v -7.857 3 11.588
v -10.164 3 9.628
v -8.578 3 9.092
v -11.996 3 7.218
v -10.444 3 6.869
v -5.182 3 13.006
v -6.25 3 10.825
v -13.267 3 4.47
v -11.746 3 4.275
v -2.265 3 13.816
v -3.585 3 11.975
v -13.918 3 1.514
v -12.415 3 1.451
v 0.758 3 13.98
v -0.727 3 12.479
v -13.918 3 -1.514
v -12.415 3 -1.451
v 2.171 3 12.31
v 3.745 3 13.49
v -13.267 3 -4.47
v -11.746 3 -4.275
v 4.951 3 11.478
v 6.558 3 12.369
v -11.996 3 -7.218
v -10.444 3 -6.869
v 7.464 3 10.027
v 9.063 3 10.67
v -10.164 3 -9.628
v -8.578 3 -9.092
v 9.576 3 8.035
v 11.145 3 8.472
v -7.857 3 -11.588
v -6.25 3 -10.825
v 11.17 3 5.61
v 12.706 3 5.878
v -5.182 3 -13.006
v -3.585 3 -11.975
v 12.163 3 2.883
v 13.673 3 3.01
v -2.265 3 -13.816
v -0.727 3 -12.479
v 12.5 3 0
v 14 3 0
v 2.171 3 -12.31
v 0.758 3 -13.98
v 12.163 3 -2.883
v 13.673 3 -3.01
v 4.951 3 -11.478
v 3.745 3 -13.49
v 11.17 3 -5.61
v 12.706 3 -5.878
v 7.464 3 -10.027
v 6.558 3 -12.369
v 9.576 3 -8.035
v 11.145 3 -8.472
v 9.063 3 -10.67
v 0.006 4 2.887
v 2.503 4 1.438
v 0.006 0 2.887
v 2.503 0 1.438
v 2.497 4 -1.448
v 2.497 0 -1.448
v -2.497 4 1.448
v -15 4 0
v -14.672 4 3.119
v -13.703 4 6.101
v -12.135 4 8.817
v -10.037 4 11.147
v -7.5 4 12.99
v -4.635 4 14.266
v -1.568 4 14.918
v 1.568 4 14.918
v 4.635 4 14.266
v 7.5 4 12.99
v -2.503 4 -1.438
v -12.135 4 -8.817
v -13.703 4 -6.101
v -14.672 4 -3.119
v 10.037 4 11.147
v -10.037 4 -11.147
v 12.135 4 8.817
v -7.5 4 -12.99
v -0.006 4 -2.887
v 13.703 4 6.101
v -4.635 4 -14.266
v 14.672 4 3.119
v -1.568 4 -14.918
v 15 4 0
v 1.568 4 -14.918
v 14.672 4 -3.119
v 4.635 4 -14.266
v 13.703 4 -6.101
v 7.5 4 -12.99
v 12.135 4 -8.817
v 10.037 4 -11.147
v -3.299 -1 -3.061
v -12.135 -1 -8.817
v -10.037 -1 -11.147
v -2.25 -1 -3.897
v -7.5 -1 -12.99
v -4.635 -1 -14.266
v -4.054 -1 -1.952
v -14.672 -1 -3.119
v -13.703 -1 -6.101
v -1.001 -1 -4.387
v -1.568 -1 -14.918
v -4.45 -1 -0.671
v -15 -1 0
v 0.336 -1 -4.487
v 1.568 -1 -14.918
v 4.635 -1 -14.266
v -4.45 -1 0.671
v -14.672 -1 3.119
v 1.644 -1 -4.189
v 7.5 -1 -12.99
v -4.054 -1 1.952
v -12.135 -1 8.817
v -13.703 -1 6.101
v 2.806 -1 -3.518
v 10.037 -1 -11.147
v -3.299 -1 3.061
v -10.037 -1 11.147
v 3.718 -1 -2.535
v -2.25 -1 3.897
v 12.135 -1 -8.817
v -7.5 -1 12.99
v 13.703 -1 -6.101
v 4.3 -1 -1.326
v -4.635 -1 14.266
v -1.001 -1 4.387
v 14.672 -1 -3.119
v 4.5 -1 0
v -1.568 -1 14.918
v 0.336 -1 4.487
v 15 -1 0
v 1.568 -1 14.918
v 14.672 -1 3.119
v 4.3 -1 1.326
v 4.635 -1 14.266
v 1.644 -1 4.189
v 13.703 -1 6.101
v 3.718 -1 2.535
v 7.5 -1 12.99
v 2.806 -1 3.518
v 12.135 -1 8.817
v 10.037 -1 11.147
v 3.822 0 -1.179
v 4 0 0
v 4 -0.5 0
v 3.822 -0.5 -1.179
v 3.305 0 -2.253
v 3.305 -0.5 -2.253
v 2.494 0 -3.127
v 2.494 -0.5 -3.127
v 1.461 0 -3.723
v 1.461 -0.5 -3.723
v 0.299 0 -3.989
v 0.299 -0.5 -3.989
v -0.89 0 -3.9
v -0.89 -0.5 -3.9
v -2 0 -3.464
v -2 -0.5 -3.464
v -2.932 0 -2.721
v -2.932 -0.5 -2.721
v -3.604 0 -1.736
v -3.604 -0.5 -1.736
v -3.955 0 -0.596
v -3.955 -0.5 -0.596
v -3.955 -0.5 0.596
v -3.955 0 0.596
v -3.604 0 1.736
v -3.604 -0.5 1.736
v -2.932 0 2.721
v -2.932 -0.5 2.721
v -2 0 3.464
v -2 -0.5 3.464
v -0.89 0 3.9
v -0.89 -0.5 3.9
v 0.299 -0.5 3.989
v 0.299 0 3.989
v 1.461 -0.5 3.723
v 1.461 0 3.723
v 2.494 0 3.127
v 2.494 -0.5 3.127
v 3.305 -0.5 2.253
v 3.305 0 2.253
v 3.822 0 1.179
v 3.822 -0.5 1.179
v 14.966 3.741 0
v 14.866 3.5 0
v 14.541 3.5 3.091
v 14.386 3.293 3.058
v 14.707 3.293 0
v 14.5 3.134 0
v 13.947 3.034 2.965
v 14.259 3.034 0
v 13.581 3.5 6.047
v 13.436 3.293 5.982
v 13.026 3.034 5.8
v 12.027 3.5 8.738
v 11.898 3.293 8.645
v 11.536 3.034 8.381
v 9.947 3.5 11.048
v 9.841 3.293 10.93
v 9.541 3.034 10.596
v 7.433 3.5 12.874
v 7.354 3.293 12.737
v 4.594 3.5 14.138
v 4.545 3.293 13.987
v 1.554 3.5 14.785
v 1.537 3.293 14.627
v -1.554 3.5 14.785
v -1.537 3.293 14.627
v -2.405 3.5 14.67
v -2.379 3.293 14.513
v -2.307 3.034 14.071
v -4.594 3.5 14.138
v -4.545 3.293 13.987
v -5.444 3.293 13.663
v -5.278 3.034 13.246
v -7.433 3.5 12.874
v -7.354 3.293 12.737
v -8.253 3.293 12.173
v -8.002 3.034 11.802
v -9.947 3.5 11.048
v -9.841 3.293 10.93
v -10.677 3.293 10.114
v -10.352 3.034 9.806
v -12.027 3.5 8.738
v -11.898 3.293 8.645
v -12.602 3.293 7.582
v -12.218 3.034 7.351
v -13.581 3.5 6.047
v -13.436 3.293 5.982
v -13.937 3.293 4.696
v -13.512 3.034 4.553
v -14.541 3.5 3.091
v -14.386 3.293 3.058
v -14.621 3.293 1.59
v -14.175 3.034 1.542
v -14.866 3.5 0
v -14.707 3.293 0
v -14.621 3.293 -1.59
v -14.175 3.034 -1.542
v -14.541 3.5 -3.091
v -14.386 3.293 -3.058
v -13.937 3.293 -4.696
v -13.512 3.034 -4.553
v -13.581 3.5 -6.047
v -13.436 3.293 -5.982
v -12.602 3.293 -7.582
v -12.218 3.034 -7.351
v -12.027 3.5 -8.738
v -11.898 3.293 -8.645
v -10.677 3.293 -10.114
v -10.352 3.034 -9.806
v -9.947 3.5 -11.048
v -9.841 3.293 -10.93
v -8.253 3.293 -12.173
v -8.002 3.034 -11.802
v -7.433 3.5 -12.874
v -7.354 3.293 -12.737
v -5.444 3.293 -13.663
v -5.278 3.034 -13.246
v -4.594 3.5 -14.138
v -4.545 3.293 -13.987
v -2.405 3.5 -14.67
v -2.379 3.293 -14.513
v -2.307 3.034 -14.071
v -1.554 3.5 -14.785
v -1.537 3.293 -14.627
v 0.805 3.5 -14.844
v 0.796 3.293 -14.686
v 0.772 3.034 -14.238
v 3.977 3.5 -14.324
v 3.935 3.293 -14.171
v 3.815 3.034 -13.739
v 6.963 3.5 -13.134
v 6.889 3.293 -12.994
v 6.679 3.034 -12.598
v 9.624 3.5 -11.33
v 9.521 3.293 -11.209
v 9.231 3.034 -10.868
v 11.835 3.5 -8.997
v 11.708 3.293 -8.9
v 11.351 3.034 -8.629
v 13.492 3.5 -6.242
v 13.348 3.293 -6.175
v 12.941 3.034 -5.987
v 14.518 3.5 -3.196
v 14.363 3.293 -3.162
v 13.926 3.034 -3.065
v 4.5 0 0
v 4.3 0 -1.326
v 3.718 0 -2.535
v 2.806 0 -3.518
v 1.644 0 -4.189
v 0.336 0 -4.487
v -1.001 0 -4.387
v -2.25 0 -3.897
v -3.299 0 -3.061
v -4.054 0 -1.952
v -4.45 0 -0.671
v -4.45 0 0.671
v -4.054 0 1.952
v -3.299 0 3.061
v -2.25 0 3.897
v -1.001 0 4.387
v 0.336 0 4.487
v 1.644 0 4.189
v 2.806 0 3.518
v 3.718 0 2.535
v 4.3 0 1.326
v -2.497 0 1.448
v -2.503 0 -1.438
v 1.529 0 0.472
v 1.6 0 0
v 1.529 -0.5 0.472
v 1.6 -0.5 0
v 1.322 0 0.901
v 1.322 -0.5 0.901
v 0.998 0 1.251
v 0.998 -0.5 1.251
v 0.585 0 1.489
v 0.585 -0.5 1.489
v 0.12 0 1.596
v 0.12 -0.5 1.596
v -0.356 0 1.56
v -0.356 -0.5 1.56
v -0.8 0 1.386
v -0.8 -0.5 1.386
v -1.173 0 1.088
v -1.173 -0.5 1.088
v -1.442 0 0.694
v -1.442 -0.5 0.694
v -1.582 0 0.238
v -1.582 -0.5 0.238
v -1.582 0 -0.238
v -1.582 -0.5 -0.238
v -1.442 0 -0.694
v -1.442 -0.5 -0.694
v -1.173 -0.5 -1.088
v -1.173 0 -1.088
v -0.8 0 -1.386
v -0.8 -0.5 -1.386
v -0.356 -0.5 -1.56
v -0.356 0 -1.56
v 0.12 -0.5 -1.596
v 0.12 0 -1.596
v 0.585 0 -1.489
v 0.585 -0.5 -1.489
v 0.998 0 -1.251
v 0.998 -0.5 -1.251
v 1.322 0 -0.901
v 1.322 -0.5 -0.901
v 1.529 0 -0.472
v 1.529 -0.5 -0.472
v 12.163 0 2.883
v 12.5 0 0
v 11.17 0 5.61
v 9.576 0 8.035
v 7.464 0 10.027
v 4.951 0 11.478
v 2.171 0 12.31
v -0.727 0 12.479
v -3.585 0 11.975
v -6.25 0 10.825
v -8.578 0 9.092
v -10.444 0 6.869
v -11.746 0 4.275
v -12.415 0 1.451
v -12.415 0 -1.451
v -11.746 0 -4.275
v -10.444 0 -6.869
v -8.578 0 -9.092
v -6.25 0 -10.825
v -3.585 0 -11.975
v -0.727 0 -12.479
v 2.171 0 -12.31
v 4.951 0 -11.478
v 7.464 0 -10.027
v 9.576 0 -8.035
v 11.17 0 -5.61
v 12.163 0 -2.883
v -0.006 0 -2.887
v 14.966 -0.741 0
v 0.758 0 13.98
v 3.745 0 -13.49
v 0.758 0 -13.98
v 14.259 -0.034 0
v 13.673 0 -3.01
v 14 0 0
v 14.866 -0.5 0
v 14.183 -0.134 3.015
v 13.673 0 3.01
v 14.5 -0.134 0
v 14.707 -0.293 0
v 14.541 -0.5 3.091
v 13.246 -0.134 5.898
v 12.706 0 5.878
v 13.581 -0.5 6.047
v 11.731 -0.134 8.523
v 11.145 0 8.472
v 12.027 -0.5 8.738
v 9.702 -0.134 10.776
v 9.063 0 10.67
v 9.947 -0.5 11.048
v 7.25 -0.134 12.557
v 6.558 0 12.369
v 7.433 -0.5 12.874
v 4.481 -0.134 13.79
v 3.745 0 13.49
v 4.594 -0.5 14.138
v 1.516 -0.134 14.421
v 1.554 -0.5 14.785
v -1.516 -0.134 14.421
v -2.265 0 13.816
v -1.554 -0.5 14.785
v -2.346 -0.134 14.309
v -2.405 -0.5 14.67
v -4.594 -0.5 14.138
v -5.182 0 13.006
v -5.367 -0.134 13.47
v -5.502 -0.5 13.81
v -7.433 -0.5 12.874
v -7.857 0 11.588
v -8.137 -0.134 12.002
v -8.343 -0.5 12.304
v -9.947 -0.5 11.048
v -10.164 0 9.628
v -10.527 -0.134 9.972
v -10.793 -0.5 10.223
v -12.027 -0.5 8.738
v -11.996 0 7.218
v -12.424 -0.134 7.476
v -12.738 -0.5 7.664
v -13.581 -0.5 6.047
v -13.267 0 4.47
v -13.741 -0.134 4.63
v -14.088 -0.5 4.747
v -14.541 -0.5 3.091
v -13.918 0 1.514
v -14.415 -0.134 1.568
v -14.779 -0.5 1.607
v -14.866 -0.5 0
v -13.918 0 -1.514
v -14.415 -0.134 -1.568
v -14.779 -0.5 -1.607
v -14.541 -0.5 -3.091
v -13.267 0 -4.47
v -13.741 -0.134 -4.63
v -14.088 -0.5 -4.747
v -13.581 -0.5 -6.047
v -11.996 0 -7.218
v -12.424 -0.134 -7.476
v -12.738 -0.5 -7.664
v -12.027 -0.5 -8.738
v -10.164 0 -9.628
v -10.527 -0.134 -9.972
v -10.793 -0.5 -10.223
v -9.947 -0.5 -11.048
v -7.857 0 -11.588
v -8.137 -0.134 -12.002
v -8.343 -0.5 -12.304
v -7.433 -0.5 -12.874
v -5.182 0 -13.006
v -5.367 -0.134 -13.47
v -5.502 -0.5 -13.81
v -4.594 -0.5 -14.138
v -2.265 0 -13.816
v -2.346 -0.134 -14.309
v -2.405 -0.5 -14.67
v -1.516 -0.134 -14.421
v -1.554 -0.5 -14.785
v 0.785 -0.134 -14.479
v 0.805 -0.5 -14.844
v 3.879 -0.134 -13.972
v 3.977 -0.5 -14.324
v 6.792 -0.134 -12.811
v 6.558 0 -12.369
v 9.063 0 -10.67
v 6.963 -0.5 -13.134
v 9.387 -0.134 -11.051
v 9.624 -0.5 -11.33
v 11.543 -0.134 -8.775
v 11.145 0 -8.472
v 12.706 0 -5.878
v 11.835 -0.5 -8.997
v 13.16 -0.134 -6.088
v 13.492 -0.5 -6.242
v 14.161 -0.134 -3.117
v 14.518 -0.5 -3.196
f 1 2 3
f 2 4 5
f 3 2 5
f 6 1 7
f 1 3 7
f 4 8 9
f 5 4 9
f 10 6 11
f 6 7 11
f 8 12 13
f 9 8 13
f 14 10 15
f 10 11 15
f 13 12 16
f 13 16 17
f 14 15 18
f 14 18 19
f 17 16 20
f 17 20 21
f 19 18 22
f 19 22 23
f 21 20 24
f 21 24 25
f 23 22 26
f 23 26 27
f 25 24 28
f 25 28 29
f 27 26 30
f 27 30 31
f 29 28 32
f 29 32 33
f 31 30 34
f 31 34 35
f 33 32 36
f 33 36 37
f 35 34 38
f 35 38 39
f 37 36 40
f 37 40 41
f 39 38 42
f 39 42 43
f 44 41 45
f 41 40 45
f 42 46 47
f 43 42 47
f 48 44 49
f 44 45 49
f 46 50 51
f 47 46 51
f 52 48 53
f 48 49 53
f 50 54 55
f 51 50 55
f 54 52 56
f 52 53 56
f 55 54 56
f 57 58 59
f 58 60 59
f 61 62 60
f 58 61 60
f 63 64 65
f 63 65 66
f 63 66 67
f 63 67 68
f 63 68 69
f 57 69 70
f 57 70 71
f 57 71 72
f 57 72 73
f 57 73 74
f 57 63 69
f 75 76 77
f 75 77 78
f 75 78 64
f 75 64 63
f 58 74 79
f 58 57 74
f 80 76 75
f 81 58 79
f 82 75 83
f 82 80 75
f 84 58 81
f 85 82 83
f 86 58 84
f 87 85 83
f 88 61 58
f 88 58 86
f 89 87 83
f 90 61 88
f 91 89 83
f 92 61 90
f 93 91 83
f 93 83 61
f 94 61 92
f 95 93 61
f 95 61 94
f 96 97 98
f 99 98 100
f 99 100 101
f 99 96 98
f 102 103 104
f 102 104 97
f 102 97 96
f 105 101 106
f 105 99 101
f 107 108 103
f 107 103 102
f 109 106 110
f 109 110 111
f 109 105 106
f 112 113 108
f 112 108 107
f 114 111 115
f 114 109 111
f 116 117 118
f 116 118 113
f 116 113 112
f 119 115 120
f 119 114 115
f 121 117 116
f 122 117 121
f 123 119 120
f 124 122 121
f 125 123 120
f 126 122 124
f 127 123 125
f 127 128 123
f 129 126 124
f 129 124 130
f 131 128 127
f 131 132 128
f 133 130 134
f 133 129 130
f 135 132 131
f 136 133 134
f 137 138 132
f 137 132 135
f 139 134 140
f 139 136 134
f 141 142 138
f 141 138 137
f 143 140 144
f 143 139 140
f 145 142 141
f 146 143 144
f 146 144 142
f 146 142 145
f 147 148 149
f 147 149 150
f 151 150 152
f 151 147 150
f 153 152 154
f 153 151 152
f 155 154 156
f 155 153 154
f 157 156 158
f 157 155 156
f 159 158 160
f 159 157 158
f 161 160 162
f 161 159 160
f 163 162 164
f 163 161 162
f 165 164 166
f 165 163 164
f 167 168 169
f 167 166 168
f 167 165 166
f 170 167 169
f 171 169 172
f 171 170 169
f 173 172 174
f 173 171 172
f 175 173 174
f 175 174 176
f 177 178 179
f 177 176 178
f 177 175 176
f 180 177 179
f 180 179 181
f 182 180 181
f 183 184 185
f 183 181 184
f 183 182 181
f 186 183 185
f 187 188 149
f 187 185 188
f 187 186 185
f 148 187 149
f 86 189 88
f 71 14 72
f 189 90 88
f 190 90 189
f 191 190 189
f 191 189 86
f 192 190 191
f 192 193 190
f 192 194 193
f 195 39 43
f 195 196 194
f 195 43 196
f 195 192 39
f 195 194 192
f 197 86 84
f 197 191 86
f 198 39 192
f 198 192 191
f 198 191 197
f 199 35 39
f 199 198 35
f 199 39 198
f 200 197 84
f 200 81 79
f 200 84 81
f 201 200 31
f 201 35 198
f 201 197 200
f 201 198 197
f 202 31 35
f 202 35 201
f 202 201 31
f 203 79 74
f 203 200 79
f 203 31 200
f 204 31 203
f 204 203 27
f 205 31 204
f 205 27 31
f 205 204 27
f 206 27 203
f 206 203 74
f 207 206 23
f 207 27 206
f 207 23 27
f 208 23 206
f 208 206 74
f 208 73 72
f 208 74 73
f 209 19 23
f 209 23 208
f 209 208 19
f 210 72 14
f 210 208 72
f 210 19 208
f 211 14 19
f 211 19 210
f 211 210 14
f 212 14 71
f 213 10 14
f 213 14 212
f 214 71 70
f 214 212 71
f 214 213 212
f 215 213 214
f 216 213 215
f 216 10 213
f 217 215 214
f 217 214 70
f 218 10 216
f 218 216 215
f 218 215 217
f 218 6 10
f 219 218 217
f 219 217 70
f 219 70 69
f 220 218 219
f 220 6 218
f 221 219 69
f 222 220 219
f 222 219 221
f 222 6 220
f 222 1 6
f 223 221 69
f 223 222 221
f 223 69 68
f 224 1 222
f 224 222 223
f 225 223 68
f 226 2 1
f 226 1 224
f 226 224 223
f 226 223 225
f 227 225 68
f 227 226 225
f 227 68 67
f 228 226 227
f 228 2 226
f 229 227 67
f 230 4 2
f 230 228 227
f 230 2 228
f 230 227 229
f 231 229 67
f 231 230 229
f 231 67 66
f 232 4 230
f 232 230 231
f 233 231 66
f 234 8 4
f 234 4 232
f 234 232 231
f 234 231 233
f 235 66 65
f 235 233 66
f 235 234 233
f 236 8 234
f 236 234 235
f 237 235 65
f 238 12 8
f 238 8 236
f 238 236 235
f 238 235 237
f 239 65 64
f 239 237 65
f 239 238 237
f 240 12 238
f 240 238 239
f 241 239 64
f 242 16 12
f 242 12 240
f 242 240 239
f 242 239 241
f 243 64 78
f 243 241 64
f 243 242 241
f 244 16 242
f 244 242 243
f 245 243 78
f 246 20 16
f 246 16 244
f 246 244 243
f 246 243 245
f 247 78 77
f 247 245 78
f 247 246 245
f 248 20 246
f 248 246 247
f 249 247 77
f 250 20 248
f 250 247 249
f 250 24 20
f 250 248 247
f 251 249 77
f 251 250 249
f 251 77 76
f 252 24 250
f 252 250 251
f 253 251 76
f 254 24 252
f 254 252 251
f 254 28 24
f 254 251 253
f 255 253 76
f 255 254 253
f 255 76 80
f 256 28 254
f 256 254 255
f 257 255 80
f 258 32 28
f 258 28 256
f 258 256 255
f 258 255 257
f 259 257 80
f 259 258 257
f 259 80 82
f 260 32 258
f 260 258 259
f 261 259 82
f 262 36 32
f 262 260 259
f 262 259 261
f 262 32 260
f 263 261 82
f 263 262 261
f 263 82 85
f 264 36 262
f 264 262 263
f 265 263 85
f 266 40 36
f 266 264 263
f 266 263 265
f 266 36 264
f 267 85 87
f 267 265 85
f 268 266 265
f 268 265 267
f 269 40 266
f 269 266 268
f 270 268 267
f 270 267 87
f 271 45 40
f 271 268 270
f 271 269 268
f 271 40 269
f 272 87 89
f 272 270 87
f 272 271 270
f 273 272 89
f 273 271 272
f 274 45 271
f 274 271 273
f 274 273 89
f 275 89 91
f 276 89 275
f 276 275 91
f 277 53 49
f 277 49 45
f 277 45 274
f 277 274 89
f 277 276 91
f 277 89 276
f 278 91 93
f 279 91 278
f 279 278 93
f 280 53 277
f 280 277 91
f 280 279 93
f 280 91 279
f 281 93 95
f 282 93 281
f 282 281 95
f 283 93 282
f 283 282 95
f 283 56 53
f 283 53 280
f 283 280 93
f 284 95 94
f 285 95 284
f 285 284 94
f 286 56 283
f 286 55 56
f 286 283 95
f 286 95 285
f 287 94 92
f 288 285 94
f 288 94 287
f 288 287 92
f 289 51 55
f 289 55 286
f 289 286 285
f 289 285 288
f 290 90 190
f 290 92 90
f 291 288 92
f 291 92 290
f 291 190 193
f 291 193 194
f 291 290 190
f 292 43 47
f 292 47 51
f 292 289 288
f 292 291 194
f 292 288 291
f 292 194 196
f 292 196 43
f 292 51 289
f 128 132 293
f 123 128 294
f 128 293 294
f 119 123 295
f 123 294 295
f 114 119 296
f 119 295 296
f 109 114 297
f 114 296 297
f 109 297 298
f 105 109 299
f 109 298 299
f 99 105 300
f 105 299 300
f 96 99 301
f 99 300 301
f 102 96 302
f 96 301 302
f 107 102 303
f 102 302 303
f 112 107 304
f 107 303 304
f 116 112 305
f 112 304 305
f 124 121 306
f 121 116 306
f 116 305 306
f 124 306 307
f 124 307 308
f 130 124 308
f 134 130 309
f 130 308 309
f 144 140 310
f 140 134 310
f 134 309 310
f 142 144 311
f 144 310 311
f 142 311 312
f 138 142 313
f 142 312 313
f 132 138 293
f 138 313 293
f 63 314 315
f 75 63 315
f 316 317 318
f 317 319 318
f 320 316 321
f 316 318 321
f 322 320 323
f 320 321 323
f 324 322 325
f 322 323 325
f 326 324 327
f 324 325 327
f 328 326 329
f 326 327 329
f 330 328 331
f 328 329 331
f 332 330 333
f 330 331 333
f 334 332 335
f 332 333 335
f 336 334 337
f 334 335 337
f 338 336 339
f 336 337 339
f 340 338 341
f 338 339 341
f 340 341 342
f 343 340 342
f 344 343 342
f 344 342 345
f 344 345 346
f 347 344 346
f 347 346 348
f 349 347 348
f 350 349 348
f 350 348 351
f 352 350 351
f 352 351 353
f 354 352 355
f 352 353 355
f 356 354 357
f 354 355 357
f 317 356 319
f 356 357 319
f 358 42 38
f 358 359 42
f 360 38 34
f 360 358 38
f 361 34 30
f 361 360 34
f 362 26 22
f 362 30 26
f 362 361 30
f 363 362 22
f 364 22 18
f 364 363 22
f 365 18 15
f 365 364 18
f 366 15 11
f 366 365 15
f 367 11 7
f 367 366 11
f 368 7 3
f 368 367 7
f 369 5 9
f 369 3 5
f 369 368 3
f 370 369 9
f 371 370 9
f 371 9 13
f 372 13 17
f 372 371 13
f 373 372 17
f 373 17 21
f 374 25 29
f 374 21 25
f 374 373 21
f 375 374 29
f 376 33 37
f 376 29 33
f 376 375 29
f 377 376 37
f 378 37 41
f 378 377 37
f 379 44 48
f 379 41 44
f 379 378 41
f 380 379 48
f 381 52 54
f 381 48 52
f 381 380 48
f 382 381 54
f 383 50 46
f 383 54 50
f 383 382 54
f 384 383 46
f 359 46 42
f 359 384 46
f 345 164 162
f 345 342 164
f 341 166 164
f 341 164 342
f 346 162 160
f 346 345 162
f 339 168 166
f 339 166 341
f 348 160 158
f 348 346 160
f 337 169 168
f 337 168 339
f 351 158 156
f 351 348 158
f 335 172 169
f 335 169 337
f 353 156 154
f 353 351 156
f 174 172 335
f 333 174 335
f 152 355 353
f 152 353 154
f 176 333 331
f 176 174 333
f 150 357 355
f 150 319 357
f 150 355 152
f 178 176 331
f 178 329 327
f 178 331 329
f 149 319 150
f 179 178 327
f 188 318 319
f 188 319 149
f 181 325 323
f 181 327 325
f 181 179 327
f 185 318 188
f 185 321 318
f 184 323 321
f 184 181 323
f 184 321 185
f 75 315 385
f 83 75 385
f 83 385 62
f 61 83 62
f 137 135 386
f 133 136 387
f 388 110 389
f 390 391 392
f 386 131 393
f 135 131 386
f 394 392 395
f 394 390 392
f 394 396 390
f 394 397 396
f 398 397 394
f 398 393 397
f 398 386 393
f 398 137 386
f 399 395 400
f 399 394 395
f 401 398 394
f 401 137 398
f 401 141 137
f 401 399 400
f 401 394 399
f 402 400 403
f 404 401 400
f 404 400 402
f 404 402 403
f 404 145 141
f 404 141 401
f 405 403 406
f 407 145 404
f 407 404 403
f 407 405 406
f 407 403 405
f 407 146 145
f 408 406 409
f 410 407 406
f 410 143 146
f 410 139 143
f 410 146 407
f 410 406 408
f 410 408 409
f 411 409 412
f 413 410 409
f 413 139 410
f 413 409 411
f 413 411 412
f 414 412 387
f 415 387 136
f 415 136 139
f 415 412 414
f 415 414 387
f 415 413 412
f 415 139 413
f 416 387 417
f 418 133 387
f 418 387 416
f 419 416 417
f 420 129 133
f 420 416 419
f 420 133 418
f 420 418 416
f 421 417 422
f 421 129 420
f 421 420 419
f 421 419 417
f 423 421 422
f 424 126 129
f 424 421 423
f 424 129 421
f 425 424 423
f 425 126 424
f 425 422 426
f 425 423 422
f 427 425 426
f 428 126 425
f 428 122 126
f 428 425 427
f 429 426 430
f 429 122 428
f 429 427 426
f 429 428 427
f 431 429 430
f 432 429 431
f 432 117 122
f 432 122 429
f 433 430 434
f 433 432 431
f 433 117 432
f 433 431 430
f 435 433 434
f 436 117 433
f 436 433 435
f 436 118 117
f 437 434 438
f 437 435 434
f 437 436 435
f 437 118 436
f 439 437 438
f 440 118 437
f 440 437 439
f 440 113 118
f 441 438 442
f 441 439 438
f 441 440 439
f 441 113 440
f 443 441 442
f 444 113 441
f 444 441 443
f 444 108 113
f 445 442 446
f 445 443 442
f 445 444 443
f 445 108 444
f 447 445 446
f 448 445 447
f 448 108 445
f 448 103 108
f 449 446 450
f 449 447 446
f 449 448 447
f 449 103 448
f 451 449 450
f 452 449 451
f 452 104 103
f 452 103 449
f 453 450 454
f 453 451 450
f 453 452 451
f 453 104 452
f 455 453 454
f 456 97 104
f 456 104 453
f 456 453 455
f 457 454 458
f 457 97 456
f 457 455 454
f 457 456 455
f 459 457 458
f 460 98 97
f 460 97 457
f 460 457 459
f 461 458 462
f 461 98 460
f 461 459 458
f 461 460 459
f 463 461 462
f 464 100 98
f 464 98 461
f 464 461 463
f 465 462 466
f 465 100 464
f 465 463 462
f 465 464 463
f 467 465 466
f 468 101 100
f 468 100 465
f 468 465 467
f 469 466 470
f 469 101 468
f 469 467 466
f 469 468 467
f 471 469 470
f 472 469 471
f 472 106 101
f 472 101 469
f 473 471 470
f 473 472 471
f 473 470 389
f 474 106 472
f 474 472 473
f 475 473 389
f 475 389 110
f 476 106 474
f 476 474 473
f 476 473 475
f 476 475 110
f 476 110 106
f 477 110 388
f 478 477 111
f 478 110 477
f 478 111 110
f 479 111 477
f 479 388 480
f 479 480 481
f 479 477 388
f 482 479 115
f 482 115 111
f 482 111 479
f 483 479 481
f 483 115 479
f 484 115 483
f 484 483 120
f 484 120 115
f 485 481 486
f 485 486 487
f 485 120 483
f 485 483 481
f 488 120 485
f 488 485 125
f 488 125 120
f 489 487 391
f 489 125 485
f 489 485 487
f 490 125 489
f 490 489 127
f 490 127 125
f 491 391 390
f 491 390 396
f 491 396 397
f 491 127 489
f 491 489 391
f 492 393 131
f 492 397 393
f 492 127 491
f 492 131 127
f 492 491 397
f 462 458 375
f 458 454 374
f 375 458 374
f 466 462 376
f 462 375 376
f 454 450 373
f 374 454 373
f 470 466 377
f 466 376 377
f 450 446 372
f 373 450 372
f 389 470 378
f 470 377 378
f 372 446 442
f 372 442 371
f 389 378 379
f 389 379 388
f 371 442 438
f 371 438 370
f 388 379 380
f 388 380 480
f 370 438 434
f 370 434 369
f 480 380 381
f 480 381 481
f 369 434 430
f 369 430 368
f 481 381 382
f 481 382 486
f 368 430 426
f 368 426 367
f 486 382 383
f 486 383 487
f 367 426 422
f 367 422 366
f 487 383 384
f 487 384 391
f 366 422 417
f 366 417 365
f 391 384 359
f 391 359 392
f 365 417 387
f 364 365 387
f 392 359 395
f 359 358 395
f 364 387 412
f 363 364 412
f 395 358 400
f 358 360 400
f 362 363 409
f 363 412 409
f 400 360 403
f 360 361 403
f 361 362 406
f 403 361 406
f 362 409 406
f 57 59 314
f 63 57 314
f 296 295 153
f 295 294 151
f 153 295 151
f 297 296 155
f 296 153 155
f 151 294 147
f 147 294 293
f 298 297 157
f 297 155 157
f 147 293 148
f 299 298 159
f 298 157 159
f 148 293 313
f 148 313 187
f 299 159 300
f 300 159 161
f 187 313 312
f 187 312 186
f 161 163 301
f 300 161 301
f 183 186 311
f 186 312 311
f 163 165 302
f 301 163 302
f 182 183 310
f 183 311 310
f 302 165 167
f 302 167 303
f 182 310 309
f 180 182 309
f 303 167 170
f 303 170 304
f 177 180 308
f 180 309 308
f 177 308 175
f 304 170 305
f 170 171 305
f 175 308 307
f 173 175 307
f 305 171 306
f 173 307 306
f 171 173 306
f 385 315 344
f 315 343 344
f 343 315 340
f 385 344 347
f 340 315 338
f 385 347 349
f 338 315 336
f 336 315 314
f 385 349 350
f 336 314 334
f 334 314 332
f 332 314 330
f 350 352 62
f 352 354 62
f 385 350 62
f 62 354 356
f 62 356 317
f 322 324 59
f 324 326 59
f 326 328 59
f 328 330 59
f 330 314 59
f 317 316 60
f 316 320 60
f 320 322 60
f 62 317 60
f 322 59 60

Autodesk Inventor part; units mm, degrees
ref_plane "YZ Plane" through (0, 0, 0) normal (1, 0, 0) x (0, 1, 0)
ref_plane "XZ Plane" through (0, 0, 0) normal (0, 1, 0) x (-1, 0, 0)
ref_plane "XY Plane" through (0, 0, 0) normal (0, 0, 1) x (1, 0, 0)
sketch "스케치1" plane through (0, 0, 0) normal (0, 1, 0) x (-1, 0, 0)
  line L0 (2.4971, 1.4484) -> (2.5029, -1.4383)
  line L1 (2.5029, -1.4383) -> (0.0058, -2.8867)
  line L2 (0.0058, -2.8867) -> (-2.4971, -1.4484)
  line L3 (-2.4971, -1.4484) -> (-2.5029, 1.4383)
  line L4 (-2.5029, 1.4383) -> (-0.0058, 2.8867)
  line L5 (-0.0058, 2.8867) -> (2.4971, 1.4484)
  circle A0 centre (0, 0) radius 4.5
  circle A1 centre (0, 0) radius 15
  circle A2 centre (0, 0) radius 12.5
  dimension "d0" = 5
  dimension "d1" = 9
  dimension "d2" = 30
  dimension "d3" = 25
extrude "돌출1" add sketch "스케치1" along normal blind 5 contours A0
sketch "스케치2" plane through (0, 0, 0) normal (0, -1, 0) x (1, 0, 0)
  circle A0 centre (0, 0) radius 15
  circle A1 centre (0, 0) radius 4.5 projected
  dimension "d6" = 30
extrude "돌출2" add sketch "스케치2" along normal blind 1
sketch "스케치3" plane through (0, 0, 0) normal (0, 1, 0) x (1, 0, 0)
  circle A0 centre (0, 0) radius 12.5
  circle A1 centre (0, 0) radius 4.5 projected
  dimension "d9" = 25
extrude "돌출3" add sketch "스케치3" along normal blind 3
sketch "스케치4" plane through (0, 3, 0) normal (0, 1, 0) x (1, 0, 0)
  circle A0 centre (0, 0) radius 15
  circle A1 centre (0, 0) radius 4.5 projected
  dimension "d12" = 30
extrude "돌출4" add sketch "스케치4" along normal blind 1
fillet "모깎기1" radius 1 2 edges at (-15, 0, 0) (-15, 3, 0)
sketch "스케치5" plane through (0, 0, 0) normal (0, -1, 0) x (1, 0, 0)
  circle A0 centre (0, 0) radius 4
  line L0 (-0.0058, -2.8867) -> (-2.5029, -1.4383) projected
  line L1 (-2.5029, -1.4383) -> (-2.4971, 1.4484) projected
  line L2 (-2.4971, 1.4484) -> (0.0058, 2.8867) projected
  line L3 (0.0058, 2.8867) -> (2.5029, 1.4383) projected
  line L4 (2.5029, 1.4383) -> (2.4971, -1.4484) projected
  line L5 (2.4971, -1.4484) -> (-0.0058, -2.8867) projected
  circle A1 centre (0, 0) radius 4.5 projected
  line L6 (-2.5029, -1.4383) -> (-2.4971, 1.4484) projected
  circle A2 centre (0, 0) radius 4.5 projected
  dimension "d16" = 8
extrude "돌출5" add sketch "스케치5" along normal blind 0.5 contours A0 | L0 L1 L2 L3 L4 L5
sketch "스케치6" plane through (0, -0.5, 0) normal (0, -1, 0) x (1, 0, 0)
  circle A0 centre (0, 0) radius 1.6
  dimension "d19" = 3.2
extrude "돌출6" cut sketch "스케치6" against normal blind 0.5
sketch "스케치7" plane through (0.0058, 0, 2.8867) normal (-0.5017425, 0, -0.8650171) x (-0.8650171, 0, 0.5017425)
  point P0 (-1.4434, 0)
sketch "스케치8" plane through (0, -1, 0) normal (0, -1, 0) x (1, 0, 0)
  point P0 (0, 0)
sketch "스케치9" plane through (0, -1, 0) normal (0, -1, 0) x (1, 0, 0)
  line L0 (-2.5029, -1.4383) -> (-0.0058, -2.8867) projected
  line L1 (-0.0058, -2.8867) -> (2.4971, -1.4484) projected
  line L2 (2.4971, -1.4484) -> (2.5029, 1.4383) projected
  line L3 (2.5029, 1.4383) -> (0.0058, 2.8867) projected
  line L4 (0.0058, 2.8867) -> (-2.4971, 1.4484) projected
  line L5 (-2.4971, 1.4484) -> (-2.5029, -1.4383) projected
  circle A0 centre (0, 0) radius 4.5 projected
  circle A1 centre (0, 0) radius 4.5 projected
  circle A2 centre (0, 0) radius 15 projected
  circle A3 centre (0, 0) radius 4.5 projected
move faces "이동1" translate (0, -0.5, 0) faces at (-3.1667, 5, 0.0034) (-4.4417, 4.3333, -0.7219)
move faces "이동2" translate (0, -0.5, 0) faces at (-3.1667, 4.5, 0.0034)
sketch "스케치10" plane through (0.0058, 0, 2.8867) normal (-0.5017425, 0, -0.8650171) x (-0.8650171, 0, 0.5017425)
  point P0 (-1.4434, 0)
sketch "스케치11" plane through (0, 4, 0) normal (0, 1, 0) x (1, 0, 0)
  line L0 (-0.0058, 2.8867) -> (2.4971, 1.4484) projected
  line L1 (0.0058, -2.8867) -> (-2.4971, -1.4484) projected
  point P0 (0, 0)
  dimension "d28" = 5
properties part number "모터기어"
